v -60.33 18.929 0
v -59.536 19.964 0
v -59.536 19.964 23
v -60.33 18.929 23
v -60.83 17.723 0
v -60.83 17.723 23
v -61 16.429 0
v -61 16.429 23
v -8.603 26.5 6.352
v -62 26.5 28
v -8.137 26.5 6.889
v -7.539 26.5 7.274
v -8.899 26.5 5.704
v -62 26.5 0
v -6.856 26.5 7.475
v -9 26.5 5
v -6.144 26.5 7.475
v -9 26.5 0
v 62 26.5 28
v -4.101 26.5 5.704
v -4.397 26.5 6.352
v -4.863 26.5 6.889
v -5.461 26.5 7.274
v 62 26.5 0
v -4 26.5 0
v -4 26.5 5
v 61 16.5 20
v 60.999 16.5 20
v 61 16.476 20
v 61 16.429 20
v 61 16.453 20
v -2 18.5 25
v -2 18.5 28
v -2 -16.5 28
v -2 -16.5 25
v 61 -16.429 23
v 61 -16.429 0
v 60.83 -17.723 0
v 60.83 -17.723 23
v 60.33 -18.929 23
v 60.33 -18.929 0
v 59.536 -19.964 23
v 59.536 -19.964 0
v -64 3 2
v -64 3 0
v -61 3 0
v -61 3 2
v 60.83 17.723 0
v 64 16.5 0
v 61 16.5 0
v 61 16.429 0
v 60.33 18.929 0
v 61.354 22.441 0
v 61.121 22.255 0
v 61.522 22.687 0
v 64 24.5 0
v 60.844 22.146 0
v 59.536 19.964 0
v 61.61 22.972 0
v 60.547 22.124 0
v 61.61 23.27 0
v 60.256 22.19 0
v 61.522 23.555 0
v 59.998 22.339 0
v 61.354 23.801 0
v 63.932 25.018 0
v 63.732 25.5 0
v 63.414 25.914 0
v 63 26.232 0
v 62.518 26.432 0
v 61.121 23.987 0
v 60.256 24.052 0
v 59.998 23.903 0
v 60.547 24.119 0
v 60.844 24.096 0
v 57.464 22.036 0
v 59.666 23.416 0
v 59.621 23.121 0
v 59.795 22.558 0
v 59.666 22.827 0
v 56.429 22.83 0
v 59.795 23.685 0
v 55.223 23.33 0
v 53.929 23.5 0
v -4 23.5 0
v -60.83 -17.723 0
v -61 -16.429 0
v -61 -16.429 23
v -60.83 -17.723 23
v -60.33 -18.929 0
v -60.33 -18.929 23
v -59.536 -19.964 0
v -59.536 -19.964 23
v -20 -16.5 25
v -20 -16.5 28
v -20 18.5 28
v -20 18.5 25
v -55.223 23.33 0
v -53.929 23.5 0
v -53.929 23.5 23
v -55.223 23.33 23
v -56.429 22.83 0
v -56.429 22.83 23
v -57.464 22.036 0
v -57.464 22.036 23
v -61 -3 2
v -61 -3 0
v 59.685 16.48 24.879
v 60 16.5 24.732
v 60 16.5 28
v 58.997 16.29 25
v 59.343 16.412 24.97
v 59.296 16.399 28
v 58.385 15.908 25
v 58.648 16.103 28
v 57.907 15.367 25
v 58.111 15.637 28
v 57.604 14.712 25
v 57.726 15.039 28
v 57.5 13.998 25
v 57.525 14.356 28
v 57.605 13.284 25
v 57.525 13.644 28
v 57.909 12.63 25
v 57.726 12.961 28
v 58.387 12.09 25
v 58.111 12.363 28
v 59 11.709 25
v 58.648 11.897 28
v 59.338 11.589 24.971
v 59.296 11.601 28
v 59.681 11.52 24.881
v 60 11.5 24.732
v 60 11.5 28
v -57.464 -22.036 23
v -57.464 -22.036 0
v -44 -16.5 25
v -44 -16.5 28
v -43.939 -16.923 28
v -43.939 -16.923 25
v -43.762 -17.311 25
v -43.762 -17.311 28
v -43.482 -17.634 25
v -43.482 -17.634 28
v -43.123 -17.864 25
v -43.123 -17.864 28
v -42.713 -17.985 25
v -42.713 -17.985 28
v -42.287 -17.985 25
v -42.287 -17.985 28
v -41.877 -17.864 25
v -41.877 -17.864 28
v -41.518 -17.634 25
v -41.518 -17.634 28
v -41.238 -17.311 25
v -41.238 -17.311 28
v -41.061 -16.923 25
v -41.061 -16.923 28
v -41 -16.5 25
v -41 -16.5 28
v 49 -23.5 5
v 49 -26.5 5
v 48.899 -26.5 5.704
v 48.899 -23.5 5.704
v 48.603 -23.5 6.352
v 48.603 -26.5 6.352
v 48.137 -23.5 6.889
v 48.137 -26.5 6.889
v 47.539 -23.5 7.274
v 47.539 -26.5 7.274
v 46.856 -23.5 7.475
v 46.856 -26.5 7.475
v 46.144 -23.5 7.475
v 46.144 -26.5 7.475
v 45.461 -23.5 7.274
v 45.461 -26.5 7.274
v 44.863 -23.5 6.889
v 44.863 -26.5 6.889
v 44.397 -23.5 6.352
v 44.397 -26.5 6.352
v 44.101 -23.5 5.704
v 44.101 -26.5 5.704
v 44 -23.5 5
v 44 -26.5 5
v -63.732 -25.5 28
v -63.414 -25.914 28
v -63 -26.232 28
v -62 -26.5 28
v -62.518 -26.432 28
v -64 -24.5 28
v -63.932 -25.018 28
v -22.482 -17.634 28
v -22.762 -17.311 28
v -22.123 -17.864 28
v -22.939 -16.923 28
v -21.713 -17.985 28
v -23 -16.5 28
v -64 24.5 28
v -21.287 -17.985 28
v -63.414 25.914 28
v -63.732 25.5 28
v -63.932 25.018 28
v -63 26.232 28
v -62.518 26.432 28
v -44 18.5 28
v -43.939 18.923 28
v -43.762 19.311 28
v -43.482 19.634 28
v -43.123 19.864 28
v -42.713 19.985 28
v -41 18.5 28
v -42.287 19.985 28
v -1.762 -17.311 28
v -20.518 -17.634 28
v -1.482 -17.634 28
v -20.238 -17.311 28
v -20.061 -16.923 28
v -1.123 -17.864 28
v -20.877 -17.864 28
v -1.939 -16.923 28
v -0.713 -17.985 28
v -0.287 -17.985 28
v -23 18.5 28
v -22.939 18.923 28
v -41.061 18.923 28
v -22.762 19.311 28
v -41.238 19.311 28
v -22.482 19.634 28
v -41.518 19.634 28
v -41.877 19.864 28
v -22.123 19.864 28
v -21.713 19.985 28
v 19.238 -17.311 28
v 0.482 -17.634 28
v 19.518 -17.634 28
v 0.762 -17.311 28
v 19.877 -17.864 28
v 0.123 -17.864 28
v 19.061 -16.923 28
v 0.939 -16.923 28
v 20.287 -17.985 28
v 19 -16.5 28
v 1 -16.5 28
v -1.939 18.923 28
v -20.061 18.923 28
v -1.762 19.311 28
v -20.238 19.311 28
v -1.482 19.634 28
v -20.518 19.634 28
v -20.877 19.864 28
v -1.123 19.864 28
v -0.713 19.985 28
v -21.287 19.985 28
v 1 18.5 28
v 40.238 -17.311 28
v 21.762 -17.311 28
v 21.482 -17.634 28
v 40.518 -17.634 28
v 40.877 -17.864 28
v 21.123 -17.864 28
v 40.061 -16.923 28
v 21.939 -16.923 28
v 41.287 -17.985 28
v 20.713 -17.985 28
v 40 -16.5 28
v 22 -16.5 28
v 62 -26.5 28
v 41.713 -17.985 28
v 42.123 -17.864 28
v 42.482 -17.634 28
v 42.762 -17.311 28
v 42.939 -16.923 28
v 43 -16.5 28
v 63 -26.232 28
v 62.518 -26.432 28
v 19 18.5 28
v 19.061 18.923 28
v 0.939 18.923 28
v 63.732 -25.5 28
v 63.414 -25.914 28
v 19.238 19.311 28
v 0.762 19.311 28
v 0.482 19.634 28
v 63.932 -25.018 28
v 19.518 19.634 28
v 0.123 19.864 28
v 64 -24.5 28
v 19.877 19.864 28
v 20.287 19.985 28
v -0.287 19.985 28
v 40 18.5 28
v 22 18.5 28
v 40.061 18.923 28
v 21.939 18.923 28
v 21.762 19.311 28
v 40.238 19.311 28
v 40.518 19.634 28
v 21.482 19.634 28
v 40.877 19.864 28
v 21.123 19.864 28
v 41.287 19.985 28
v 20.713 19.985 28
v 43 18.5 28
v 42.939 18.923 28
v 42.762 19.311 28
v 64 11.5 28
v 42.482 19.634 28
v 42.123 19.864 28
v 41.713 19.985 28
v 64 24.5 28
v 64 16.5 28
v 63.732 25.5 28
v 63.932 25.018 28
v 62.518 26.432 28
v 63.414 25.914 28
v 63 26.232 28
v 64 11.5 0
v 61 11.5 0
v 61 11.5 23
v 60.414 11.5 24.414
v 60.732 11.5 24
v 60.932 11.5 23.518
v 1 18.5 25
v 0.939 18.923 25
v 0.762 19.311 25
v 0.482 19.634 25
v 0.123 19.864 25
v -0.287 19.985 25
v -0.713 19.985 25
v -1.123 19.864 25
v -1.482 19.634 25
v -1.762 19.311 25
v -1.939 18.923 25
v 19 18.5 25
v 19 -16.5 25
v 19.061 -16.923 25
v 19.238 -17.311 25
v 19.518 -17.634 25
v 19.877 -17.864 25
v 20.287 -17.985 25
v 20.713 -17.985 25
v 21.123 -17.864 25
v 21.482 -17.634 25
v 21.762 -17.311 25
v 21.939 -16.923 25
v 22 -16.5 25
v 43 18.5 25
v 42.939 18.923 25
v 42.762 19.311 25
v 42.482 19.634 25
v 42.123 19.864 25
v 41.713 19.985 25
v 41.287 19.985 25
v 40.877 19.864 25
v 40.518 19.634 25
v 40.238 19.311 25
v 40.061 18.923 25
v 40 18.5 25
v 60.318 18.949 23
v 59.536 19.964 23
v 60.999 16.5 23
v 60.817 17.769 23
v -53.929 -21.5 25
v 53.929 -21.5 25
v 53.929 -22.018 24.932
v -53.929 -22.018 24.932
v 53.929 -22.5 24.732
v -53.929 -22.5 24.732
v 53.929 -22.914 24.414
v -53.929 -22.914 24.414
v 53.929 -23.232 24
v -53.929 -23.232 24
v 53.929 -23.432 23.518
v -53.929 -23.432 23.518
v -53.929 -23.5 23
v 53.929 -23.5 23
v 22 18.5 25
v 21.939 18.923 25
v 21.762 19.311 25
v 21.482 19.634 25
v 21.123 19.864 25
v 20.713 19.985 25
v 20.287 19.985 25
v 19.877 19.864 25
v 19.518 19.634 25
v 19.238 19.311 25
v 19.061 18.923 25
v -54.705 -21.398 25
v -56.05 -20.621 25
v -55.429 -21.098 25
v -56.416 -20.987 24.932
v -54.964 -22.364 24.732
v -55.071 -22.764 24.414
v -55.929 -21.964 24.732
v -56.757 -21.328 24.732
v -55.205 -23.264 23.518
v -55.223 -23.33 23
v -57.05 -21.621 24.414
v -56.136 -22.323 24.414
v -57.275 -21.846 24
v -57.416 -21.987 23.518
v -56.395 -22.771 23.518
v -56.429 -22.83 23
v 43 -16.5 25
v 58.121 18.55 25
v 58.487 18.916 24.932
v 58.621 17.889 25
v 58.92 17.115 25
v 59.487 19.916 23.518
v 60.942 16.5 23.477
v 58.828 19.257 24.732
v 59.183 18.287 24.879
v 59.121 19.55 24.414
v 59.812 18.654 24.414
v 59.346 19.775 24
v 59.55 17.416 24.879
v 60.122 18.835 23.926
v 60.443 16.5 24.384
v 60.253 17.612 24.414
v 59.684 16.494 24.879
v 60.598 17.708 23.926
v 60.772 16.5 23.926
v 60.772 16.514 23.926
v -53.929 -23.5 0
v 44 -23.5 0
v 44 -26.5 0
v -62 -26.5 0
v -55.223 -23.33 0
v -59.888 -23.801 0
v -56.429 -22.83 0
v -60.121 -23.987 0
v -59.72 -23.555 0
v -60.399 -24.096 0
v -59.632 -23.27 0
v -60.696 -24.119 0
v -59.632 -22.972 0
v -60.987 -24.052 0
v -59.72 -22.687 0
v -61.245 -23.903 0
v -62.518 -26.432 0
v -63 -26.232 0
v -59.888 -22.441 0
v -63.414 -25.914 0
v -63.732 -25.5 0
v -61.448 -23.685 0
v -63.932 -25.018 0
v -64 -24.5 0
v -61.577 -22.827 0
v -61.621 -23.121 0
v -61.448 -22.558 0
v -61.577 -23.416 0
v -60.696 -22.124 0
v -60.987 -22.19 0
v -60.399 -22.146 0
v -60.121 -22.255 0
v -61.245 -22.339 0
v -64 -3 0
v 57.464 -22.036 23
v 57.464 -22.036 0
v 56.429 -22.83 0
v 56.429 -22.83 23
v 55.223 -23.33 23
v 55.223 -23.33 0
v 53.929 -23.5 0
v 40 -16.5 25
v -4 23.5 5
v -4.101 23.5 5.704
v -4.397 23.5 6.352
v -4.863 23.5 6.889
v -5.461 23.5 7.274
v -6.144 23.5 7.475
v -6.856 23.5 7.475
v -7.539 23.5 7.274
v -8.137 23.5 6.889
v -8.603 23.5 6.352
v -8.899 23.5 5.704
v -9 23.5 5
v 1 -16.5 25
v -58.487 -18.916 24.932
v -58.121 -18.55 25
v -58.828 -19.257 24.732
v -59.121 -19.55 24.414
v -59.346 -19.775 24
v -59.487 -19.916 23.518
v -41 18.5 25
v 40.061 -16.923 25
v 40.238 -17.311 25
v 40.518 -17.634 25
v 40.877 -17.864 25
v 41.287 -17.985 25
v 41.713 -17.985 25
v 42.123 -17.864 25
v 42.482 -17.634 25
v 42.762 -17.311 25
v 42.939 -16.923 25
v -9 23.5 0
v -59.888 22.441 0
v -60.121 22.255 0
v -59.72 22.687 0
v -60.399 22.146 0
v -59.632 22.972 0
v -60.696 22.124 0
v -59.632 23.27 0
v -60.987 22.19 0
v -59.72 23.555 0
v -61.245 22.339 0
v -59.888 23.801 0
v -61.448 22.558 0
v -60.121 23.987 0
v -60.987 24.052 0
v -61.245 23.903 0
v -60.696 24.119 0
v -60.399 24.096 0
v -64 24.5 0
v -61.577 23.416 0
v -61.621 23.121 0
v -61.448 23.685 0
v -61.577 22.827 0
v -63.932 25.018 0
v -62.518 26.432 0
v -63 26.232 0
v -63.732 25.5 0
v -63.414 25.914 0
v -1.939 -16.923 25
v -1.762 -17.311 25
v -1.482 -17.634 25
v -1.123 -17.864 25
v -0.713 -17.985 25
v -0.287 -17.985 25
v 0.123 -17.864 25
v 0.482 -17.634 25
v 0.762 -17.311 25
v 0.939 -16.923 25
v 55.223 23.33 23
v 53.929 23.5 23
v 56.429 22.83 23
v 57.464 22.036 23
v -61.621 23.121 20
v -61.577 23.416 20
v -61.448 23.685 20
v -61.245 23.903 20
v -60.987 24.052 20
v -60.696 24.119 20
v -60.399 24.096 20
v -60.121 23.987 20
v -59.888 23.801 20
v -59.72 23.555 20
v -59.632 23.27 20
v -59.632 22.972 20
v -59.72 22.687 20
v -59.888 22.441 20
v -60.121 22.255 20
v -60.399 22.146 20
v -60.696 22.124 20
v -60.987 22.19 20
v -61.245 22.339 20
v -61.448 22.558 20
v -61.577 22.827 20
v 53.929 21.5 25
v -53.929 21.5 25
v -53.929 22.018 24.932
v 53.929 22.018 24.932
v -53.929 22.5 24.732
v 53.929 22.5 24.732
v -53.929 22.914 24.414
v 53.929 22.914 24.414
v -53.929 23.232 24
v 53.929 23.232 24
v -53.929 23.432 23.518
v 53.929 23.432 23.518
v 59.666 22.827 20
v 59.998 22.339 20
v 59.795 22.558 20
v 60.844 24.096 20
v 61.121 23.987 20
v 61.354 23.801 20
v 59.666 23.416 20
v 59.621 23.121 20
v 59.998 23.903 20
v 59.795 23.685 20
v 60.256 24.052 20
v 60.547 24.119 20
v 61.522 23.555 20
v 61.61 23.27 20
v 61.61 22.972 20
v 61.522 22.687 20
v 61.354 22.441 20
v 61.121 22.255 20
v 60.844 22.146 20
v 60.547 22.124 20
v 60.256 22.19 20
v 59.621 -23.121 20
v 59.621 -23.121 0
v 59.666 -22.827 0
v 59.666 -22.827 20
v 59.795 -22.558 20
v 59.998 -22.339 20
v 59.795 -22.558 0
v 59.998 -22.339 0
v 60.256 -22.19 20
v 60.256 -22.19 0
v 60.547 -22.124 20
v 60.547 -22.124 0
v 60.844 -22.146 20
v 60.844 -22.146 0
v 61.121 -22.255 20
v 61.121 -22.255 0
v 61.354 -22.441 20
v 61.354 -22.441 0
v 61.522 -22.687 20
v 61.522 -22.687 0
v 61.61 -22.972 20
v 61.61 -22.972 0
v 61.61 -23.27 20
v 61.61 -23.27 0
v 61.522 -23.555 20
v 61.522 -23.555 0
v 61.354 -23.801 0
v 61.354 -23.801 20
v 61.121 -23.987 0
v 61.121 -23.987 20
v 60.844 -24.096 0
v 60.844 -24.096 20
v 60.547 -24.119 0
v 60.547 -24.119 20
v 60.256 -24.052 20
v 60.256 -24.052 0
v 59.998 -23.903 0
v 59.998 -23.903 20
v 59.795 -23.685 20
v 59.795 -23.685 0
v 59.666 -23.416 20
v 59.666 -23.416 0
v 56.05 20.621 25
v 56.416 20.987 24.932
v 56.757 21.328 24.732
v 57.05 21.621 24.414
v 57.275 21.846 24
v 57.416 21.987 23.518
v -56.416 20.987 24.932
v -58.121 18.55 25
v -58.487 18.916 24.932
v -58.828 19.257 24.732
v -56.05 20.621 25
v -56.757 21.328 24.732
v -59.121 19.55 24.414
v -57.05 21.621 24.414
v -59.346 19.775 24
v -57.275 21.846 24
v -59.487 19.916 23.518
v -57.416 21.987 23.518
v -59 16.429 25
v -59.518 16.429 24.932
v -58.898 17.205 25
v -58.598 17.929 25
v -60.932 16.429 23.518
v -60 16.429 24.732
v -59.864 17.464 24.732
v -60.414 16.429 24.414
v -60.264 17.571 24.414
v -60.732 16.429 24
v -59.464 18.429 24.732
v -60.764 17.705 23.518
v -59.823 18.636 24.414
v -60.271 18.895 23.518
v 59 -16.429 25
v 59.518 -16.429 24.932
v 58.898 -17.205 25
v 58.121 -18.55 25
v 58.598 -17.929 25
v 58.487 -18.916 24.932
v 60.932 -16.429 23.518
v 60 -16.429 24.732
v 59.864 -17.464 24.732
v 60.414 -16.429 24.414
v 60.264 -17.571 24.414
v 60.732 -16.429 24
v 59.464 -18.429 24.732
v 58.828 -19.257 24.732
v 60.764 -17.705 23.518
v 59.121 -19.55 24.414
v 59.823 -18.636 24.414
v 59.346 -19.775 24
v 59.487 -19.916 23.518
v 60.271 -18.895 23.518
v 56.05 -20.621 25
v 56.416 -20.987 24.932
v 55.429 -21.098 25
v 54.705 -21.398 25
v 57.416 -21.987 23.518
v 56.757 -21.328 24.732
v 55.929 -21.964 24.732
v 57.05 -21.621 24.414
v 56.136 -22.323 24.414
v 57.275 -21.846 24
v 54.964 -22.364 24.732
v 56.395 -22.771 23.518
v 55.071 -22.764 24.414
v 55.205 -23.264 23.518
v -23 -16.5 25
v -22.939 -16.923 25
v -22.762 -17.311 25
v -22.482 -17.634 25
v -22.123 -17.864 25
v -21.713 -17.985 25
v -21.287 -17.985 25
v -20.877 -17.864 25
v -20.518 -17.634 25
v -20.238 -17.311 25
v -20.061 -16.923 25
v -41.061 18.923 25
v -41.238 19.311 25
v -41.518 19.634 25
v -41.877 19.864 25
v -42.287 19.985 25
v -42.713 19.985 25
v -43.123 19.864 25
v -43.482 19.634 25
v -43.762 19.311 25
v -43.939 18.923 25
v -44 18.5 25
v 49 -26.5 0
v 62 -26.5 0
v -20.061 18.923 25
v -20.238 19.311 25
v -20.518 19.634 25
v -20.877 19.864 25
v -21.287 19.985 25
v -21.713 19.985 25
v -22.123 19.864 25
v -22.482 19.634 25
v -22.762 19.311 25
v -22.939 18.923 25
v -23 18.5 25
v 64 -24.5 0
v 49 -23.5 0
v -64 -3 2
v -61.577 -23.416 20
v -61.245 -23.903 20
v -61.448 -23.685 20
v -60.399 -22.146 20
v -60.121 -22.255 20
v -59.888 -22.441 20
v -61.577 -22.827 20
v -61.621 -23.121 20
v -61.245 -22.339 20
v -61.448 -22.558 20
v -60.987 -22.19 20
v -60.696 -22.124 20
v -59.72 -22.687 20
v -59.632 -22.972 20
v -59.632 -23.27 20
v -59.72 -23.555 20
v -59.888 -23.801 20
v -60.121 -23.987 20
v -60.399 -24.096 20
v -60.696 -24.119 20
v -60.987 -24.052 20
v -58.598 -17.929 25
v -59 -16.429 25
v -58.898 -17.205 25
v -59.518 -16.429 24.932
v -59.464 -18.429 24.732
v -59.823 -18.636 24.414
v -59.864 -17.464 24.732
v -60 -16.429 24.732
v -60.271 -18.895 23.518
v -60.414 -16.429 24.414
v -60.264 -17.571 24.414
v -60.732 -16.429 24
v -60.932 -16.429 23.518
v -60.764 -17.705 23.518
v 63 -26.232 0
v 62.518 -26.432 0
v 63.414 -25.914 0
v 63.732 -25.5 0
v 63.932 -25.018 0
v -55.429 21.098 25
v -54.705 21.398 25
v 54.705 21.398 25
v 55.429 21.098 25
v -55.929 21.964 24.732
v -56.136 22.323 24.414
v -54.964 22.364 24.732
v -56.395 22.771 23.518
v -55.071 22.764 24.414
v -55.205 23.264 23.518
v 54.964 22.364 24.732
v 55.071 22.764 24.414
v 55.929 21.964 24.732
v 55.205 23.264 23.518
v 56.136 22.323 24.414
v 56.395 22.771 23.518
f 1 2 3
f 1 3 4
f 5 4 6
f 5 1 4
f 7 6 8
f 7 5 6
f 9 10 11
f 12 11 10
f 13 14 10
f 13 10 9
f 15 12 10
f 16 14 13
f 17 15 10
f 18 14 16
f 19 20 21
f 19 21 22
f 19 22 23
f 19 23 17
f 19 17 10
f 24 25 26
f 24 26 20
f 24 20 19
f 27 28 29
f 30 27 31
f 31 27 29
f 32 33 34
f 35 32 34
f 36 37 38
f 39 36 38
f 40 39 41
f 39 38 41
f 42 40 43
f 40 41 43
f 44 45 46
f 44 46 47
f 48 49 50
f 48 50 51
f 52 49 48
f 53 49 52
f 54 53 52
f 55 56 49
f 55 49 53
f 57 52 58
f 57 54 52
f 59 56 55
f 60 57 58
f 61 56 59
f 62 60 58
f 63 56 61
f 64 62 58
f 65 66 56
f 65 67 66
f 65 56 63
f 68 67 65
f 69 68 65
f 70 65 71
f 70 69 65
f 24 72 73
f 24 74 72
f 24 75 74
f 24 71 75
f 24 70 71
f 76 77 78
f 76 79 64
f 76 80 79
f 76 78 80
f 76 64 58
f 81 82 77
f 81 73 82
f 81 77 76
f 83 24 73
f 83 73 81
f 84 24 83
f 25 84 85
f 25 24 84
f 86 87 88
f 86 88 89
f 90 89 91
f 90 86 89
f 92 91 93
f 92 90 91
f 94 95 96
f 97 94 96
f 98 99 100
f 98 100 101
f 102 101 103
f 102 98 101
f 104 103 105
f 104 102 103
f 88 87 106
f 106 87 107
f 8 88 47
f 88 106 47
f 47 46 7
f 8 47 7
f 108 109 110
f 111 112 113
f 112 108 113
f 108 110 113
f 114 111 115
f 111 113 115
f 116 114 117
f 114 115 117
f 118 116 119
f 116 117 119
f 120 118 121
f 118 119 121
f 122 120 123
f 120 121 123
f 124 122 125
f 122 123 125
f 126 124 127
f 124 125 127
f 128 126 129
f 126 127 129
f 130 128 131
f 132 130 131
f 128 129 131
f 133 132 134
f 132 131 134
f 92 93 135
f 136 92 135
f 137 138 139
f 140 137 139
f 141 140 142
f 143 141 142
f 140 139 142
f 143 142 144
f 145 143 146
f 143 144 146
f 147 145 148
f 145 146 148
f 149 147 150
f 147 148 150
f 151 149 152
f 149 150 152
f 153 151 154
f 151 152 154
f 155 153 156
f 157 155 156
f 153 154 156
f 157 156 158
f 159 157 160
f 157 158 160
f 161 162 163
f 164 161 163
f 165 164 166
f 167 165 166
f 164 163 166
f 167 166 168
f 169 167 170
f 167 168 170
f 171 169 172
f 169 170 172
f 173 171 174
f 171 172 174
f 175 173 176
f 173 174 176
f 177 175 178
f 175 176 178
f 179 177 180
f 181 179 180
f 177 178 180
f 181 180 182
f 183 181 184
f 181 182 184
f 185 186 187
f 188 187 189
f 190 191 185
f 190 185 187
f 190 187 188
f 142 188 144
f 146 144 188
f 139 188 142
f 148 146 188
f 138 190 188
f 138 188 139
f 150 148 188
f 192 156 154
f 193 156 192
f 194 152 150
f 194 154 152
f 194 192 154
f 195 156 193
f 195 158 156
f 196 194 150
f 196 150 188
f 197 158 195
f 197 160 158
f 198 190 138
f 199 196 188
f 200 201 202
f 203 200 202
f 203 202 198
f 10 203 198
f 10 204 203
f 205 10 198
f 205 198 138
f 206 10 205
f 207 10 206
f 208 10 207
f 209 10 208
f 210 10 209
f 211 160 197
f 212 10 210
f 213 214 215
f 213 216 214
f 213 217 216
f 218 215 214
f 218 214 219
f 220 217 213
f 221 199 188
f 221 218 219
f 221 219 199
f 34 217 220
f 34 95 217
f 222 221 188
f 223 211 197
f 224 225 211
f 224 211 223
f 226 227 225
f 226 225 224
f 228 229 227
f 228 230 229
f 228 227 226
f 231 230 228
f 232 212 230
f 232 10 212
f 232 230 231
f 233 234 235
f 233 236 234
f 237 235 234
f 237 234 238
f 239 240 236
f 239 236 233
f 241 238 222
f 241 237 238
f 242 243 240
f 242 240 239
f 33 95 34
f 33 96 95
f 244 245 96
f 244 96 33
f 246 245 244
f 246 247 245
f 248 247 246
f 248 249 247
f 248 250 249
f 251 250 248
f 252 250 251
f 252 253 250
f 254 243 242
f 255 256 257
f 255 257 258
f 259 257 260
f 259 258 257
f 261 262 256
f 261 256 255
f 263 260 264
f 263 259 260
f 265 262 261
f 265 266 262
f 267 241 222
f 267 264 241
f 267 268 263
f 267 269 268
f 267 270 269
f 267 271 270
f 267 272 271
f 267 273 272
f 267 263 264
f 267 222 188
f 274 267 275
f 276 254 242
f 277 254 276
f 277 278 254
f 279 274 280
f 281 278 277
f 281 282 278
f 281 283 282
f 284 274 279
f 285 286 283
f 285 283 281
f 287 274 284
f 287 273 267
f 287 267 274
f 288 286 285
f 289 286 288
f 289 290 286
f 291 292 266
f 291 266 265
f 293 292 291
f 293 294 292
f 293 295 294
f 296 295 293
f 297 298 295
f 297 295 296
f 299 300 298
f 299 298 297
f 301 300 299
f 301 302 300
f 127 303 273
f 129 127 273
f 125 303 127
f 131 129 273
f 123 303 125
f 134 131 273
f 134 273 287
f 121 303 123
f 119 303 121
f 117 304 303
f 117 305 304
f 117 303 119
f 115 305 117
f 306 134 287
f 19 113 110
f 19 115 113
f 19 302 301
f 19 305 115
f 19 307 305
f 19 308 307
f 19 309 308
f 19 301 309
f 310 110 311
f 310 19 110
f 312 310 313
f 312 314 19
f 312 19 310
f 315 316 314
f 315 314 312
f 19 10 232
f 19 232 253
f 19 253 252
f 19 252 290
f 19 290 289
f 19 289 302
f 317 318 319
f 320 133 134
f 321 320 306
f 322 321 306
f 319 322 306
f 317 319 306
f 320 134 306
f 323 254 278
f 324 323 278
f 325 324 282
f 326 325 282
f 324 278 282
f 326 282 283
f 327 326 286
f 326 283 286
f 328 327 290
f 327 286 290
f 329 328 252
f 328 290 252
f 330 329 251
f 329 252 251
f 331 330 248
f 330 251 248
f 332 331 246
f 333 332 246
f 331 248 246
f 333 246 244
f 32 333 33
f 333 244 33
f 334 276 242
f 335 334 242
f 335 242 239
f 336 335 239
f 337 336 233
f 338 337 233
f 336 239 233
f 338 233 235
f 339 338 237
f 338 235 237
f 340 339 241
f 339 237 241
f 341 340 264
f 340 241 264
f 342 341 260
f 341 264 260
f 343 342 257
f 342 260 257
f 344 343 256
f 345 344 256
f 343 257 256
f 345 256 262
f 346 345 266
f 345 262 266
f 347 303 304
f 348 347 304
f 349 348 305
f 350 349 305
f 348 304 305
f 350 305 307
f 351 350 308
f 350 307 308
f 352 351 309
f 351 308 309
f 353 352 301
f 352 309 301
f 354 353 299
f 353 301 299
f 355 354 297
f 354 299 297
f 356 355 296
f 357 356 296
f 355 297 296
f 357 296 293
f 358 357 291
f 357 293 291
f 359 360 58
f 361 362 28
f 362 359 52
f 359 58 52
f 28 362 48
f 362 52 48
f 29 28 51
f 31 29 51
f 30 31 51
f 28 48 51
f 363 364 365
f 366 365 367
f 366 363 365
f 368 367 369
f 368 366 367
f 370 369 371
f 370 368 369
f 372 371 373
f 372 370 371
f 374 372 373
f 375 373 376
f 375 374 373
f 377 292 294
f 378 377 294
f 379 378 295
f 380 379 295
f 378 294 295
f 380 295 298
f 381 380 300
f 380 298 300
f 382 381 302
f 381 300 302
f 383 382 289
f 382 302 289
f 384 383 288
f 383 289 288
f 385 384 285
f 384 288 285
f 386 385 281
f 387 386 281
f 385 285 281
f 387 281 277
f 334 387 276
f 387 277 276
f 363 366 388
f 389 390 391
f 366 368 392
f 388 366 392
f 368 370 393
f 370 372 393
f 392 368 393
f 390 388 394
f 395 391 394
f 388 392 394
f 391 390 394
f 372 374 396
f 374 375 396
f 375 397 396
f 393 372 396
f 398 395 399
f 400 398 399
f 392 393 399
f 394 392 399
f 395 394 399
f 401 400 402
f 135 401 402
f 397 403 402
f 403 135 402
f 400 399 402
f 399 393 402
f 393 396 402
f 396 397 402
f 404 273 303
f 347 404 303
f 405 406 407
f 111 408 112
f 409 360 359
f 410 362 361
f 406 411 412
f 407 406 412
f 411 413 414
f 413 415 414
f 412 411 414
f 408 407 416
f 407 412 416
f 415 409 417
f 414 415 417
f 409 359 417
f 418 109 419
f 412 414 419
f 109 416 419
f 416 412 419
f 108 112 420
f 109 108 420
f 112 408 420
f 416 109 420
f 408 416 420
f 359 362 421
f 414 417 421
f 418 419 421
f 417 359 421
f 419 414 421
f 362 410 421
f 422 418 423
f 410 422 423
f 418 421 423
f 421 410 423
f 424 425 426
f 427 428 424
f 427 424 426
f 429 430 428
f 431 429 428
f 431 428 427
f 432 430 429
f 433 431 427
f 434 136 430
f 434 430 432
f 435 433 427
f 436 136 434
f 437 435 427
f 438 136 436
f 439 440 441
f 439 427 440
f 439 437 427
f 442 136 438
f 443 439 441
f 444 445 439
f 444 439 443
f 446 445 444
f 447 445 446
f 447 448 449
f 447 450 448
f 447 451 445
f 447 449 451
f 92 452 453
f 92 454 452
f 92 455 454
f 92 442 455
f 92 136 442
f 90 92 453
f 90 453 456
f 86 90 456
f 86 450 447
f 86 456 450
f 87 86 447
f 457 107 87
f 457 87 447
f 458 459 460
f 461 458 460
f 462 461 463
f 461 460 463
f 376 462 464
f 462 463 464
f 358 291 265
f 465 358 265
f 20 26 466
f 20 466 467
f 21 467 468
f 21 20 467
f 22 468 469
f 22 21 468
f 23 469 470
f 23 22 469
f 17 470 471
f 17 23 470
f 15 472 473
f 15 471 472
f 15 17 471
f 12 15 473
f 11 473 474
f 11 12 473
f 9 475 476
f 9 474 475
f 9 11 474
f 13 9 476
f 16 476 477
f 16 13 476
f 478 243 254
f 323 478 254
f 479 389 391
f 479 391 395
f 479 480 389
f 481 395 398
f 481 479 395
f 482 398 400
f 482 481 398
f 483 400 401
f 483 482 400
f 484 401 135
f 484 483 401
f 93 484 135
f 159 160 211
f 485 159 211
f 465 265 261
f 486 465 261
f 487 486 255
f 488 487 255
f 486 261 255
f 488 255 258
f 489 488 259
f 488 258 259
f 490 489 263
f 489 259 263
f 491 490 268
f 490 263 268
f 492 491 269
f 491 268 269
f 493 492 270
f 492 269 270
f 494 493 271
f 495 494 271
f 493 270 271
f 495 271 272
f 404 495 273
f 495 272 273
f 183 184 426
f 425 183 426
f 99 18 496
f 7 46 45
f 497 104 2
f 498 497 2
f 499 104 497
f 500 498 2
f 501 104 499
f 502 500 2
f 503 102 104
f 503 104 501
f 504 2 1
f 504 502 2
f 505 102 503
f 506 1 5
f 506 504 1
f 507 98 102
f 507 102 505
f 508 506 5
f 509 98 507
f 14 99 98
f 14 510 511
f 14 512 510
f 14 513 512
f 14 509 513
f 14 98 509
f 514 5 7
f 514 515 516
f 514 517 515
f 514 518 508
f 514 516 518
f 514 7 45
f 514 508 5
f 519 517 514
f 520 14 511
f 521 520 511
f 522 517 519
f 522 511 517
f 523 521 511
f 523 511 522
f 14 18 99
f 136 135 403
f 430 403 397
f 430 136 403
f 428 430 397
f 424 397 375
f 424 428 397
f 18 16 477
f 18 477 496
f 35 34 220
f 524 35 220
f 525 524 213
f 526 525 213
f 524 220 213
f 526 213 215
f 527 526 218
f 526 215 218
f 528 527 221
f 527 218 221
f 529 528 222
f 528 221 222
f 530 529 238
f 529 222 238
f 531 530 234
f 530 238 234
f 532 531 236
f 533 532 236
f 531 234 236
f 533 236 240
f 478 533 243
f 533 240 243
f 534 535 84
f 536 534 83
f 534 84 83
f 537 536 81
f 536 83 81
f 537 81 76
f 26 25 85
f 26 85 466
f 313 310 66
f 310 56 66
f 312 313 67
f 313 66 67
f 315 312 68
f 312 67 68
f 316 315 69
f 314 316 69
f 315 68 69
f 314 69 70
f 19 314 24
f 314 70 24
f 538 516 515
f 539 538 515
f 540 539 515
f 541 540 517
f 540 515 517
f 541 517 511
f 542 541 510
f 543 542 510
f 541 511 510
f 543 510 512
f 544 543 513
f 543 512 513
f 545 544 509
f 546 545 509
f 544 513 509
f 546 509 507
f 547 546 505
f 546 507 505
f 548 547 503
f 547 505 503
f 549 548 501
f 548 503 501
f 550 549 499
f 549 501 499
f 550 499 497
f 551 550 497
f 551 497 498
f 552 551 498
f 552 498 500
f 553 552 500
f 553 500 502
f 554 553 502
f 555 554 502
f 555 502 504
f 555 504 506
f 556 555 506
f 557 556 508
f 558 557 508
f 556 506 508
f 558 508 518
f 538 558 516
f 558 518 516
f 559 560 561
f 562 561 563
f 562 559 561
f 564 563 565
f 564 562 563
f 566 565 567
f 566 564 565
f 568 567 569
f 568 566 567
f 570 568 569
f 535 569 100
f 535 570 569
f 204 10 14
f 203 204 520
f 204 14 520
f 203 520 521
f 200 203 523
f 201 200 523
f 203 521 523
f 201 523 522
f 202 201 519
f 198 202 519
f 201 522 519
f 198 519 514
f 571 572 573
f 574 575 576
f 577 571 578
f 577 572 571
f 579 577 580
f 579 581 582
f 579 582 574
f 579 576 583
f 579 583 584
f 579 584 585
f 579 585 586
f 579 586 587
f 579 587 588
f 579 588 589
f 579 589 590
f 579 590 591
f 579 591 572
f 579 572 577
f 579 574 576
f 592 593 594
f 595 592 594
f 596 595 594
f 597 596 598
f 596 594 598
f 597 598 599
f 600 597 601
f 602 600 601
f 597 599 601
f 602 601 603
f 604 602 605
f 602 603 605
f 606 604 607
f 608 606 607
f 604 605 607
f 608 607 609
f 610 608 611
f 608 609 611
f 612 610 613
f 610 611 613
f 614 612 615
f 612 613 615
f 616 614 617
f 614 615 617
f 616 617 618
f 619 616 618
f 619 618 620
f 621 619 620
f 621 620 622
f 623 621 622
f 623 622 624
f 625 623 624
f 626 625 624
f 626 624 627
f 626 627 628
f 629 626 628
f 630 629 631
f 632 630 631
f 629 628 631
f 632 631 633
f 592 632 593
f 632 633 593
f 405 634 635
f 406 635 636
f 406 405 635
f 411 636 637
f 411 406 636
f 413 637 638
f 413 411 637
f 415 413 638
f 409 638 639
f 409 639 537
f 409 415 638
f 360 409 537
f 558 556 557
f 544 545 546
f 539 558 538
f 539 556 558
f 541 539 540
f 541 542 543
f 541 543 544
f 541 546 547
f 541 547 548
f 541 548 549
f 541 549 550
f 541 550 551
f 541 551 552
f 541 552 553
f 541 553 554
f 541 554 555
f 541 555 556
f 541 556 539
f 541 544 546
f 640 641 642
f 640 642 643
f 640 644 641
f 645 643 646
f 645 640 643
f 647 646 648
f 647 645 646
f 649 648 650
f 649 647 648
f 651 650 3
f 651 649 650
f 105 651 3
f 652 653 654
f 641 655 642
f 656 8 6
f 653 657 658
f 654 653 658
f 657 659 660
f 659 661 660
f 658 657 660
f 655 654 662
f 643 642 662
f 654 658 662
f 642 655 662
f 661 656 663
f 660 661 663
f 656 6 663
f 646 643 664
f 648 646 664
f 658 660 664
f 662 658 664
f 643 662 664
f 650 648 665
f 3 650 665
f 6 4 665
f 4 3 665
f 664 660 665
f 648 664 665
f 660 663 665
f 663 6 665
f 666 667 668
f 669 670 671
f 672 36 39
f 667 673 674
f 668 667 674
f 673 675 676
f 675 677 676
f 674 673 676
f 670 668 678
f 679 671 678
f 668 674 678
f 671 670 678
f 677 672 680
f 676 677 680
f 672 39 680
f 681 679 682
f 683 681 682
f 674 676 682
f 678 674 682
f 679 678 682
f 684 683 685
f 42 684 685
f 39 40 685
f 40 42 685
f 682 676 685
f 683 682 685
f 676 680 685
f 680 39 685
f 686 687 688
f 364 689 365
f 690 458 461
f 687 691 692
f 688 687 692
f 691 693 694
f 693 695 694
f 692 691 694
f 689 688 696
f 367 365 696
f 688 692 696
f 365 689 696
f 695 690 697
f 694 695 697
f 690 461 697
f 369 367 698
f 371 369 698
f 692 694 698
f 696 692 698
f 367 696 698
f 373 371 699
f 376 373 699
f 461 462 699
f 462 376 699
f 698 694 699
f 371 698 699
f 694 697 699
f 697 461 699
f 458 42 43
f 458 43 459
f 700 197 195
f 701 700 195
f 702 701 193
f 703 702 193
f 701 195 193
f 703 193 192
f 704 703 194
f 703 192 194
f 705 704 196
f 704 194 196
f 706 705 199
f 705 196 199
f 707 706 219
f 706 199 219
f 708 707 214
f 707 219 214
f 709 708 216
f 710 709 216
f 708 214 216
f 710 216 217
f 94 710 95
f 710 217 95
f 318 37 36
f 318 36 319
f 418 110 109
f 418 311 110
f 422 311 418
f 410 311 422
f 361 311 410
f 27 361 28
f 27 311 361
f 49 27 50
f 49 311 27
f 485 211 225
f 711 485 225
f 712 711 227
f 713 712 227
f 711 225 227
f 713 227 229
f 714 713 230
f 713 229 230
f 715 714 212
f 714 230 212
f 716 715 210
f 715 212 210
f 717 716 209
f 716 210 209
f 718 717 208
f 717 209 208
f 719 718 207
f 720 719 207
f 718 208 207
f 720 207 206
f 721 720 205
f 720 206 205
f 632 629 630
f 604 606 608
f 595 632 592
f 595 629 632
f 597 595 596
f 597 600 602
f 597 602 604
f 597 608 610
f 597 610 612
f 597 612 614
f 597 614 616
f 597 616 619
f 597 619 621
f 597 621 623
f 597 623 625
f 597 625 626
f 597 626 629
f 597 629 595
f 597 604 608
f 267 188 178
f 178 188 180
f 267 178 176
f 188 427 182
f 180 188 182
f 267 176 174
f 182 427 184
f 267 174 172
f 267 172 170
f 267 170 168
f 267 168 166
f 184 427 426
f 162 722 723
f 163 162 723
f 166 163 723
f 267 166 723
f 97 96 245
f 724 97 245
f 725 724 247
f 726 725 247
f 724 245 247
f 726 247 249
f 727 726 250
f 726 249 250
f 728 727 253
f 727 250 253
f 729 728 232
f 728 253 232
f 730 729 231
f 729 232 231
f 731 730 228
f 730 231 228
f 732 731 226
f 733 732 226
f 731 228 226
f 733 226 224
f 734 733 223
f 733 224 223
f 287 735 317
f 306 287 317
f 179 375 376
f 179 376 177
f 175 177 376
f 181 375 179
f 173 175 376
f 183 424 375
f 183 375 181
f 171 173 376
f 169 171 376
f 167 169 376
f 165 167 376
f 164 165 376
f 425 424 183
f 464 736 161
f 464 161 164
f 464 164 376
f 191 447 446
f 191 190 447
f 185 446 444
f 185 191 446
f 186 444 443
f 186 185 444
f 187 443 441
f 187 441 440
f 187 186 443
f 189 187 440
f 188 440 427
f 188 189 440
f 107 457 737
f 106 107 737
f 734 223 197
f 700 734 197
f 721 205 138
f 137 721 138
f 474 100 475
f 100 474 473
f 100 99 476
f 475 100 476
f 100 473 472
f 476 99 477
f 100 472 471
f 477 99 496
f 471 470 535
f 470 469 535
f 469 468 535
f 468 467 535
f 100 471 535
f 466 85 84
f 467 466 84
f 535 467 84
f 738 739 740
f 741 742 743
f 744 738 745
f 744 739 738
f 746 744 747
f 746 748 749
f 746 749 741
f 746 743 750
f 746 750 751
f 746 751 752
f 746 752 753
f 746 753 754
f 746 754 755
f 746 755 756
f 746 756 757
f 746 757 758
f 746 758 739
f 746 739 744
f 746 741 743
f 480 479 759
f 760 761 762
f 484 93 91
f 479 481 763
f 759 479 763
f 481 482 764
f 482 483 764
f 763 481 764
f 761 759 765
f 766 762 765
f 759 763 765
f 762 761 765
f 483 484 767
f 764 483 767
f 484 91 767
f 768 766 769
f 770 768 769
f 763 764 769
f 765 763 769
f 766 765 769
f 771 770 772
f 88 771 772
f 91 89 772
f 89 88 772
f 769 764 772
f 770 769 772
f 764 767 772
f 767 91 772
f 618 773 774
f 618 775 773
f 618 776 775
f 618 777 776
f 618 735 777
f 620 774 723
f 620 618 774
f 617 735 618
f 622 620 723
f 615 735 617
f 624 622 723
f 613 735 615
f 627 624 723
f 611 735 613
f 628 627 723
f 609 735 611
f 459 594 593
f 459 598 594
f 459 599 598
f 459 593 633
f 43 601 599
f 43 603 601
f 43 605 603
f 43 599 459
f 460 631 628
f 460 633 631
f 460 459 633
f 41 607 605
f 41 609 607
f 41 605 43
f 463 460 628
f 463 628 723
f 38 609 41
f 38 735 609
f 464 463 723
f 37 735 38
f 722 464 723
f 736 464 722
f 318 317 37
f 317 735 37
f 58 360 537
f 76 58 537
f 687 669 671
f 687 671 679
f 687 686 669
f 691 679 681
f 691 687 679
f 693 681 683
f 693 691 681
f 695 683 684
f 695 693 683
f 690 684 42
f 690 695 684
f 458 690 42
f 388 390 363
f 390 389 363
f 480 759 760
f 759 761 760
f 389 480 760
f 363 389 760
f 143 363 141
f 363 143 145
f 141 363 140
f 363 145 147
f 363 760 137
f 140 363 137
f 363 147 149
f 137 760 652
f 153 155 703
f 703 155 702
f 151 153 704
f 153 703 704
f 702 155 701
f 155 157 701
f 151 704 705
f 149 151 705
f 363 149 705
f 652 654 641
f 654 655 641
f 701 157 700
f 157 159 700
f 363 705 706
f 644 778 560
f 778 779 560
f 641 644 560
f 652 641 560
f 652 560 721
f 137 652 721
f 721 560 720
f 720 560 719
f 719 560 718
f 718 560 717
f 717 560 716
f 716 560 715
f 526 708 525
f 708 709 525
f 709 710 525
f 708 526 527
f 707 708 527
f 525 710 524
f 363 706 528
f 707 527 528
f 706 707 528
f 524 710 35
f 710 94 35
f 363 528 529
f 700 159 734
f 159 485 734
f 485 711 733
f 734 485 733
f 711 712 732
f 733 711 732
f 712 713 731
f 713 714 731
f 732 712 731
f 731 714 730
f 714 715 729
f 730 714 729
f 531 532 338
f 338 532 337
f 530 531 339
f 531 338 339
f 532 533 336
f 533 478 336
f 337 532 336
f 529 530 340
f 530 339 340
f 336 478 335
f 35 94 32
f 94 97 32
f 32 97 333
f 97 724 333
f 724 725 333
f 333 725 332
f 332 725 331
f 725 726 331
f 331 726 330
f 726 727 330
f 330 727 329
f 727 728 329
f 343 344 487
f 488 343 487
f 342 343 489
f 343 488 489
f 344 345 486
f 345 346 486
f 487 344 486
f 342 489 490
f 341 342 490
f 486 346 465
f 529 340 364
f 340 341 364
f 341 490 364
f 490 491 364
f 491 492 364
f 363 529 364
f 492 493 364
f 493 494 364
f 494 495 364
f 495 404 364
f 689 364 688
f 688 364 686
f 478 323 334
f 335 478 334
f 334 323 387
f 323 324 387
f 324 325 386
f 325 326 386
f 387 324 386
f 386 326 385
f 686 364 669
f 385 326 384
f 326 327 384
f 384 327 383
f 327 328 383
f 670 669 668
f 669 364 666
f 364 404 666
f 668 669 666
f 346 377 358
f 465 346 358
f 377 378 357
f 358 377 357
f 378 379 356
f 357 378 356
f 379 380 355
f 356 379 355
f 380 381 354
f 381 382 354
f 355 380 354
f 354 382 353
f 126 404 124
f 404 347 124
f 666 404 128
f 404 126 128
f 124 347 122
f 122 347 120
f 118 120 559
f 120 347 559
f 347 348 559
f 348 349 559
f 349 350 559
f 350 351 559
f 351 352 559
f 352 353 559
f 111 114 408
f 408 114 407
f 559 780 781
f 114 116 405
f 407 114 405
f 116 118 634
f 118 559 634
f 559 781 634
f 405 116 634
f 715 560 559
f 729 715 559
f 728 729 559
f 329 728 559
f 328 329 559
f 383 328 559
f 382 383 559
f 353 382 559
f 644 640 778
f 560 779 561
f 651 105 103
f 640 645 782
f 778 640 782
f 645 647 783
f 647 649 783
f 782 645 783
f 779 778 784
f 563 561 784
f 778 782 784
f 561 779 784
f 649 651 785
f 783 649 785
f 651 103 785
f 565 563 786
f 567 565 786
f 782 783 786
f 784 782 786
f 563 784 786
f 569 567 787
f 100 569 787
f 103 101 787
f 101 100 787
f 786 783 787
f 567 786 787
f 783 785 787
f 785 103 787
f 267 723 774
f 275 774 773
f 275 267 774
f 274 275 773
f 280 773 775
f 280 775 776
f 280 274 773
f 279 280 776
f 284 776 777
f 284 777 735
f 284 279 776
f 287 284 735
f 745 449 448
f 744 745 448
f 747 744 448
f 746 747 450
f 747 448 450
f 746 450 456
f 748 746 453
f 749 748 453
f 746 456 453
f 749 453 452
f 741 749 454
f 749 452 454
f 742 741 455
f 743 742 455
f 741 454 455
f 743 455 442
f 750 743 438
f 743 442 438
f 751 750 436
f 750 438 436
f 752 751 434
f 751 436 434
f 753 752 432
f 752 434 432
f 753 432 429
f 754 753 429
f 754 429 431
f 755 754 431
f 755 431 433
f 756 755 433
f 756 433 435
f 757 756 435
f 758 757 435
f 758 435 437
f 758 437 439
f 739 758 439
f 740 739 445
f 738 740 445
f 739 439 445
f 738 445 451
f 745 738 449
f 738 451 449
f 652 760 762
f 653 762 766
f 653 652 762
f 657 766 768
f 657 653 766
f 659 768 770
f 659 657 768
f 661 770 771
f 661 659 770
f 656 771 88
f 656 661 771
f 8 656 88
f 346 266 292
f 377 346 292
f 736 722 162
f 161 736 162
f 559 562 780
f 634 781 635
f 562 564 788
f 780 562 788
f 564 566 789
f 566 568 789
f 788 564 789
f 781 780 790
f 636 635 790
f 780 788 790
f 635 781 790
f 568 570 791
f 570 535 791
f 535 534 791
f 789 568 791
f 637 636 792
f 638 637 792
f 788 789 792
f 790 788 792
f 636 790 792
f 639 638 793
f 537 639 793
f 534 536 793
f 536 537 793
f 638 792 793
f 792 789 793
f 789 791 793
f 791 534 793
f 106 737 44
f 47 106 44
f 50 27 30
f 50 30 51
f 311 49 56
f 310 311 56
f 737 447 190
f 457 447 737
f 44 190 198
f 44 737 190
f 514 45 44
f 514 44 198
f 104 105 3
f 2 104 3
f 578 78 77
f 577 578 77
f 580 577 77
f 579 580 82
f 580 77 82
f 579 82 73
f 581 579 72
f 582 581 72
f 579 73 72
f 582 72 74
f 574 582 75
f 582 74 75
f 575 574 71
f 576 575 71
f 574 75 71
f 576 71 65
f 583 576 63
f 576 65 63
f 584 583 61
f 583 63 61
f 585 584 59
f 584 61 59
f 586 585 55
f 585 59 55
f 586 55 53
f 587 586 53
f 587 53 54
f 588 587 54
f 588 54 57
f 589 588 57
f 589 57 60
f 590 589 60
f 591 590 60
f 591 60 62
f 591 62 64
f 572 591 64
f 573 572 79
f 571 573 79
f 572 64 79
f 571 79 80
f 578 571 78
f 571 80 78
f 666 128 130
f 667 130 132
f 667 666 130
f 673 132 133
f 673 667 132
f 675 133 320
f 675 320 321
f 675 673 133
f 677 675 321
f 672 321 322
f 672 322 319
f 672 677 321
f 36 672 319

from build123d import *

# Parameters (mm, degrees)
ESQUISSE1_W             = 128
ESQUISSE1_H             = 53
ESQUISSE1_W_2           = 122
ESQUISSE1_H_2           = 47
BOSS_EXTRU_1_DEPTH      = 25
ESQUISSE2_W             = 128
ESQUISSE2_H             = 53
BOSS_EXTRU_2_DEPTH      = 3
BOSS_EXTRU_3_DEPTH      = 25
ENL_V_MAT_EXTRU_1_DEPTH = 3
ESQUISSE5_R             = 1
ENL_V_MAT_EXTRU_2_DEPTH = 20
CONG_1_R                = 5
CONG_2_R                = 5
ESQUISSE6_W             = 28
ESQUISSE6_H             = 5
ENL_V_MAT_EXTRU_3_DEPTH = 3
ENL_V_MAT_EXTRU_4_DEPTH = 8
ENL_V_MAT_EXTRU_6_DEPTH = 8
ENL_V_MAT_EXTRU_7_DEPTH = 8
ESQUISSE13_W            = 2
ESQUISSE13_H            = 6
ENL_V_MAT_EXTRU_8_DEPTH = 3
CONG_4_R                = 2
CONG_5_R                = 2


with BuildPart() as part:
    # Esquisse1 → Boss.-Extru.1 (new body)
    with BuildSketch(Plane.XY):
        Rectangle(ESQUISSE1_W, ESQUISSE1_H)
        Rectangle(ESQUISSE1_W_2, ESQUISSE1_H_2, mode=Mode.SUBTRACT)
    extrude(amount=BOSS_EXTRU_1_DEPTH)

    # Esquisse2 → Boss.-Extru.2 (add)
    with BuildSketch(Plane.XY.offset(25)):
        Rectangle(ESQUISSE2_W, ESQUISSE2_H)
    extrude(amount=BOSS_EXTRU_2_DEPTH)

    # Esquisse3 → Boss.-Extru.3 (add)
    with BuildSketch(Plane(origin=(0, 0, 25), x_dir=(-1, 0, 0), z_dir=(0, 0, -1))):
        Polygon((61, 23.5), (56, 23.5), (61, 18.5), align=None)
        Polygon((61, -23.5), (61, -18.5), (56, -23.5), align=None)
        Polygon((-61, -23.5), (-61, -18.5), (-56, -23.5), align=None)
        Polygon((-61, 18.5), (-56, 23.5), (-61, 23.5), align=None)
    extrude(amount=BOSS_EXTRU_3_DEPTH)

    # Esquisse4 → Enlèv. mat.-Extru.1 (cut)
    with BuildSketch(Plane.XY.offset(28)):
        with BuildLine():
            Line((-44, 18.5), (-44, -16.5))
            ThreePointArc((-44, -16.5), (-42.5, -18), (-41, -16.5))
            Line((-41, -16.5), (-41, 18.5))
            ThreePointArc((-41, 18.5), (-42.5, 20), (-44, 18.5))
        make_face()
        with BuildLine():
            Line((-23, 18.5), (-23, -16.5))
            ThreePointArc((-23, -16.5), (-21.5, -18), (-20, -16.5))
            Line((-20, -16.5), (-20, 18.5))
            ThreePointArc((-20, 18.5), (-21.5, 20), (-23, 18.5))
        make_face()
        with BuildLine():
            Line((-2, 18.5), (-2, -16.5))
            ThreePointArc((-2, -16.5), (-0.5, -18), (1, -16.5))
            Line((1, -16.5), (1, 18.5))
            ThreePointArc((1, 18.5), (-0.5, 20), (-2, 18.5))
        make_face()
        with BuildLine():
            Line((19, 18.5), (19, -16.5))
            ThreePointArc((19, -16.5), (20.5, -18), (22, -16.5))
            Line((22, -16.5), (22, 18.5))
            ThreePointArc((22, 18.5), (20.5, 20), (19, 18.5))
        make_face()
        with BuildLine():
            Line((40, 18.5), (40, -16.5))
            ThreePointArc((40, -16.5), (41.5, -18), (43, -16.5))
            Line((43, -16.5), (43, 18.5))
            ThreePointArc((43, 18.5), (41.5, 20), (40, 18.5))
        make_face()
    extrude(amount=-ENL_V_MAT_EXTRU_1_DEPTH, mode=Mode.SUBTRACT)

    # Esquisse5 → Enlèv. mat.-Extru.2 (cut)
    with BuildSketch(Plane(origin=(0, 0, 0), x_dir=(-1, 0, 0), z_dir=(0, 0, -1))):
        with Locations((-60.621320344, 23.121320344)):
            Circle(ESQUISSE5_R)
        with Locations((60.621320344, 23.121320344)):
            Circle(ESQUISSE5_R)
        with Locations((-60.621320344, -23.121320344)):
            Circle(ESQUISSE5_R)
        with Locations((60.621320344, -23.121320344)):
            Circle(ESQUISSE5_R)
    extrude(amount=-ENL_V_MAT_EXTRU_2_DEPTH, mode=Mode.SUBTRACT)

    # Congé1
    cong_1_edges = [part.edges().sort_by_distance(p)[0] for p in [
        (56, 23.5, 12.5),
    ]]
    fillet(cong_1_edges, radius=CONG_1_R)

    # Congé2
    cong_2_edges = [part.edges().sort_by_distance(p)[0] for p in [
        (-56, 23.5, 12.5),
        (-61, 18.5, 12.5),
        (-56, -23.5, 12.5),
        (-61, -18.5, 12.5),
        (56, -23.5, 12.5),
        (61, -18.5, 12.5),
        (61, 18.5, 12.5),
    ]]
    fillet(cong_2_edges, radius=CONG_2_R)

    # Esquisse6 → Enlèv. mat.-Extru.3 (cut)
    with BuildSketch(Plane(origin=(64, 0, 0), x_dir=(0, 0, -1), z_dir=(1, 0, 0))):
        with Locations((-14, 14)):
            Rectangle(ESQUISSE6_W, ESQUISSE6_H)
    extrude(amount=-ENL_V_MAT_EXTRU_3_DEPTH, mode=Mode.SUBTRACT)

    # Esquisse7 → Enlèv. mat.-Extru.4 (cut)
    with BuildSketch(Plane(origin=(0, 26.5, 0), x_dir=(1, 0, 0), z_dir=(0, 1, 0))):
        with BuildLine():
            Line((-9, 0), (-4, 0))
            Line((-4, 0), (-4, -5))
            ThreePointArc((-4, -5), (-6.5, -7.5), (-9, -5))
            Line((-9, -5), (-9, 0))
        make_face()
    extrude(amount=-ENL_V_MAT_EXTRU_4_DEPTH, mode=Mode.SUBTRACT)

    # Esquisse9 → Enlèv. mat.-Extru.6 (cut)
    with BuildSketch(Plane.XZ.offset(26.5)):
        with BuildLine():
            Line((44, 0), (49, 0))
            Line((49, 0), (49, 5))
            ThreePointArc((49, 5), (46.5, 7.5), (44, 5))
            Line((44, 5), (44, 0))
        make_face()
    extrude(amount=-ENL_V_MAT_EXTRU_6_DEPTH, mode=Mode.SUBTRACT)

    # Esquisse10 → Enlèv. mat.-Extru.7 (cut)
    with BuildSketch(Plane.XY.offset(28)):
        with BuildLine():
            Line((61, 16.5), (60, 16.5))
            ThreePointArc((60, 16.5), (57.5, 14), (60, 11.5))
            Line((60, 11.5), (61, 11.5))
            Line((61, 11.5), (61, 16.5))
        make_face()
    extrude(amount=-ENL_V_MAT_EXTRU_7_DEPTH, mode=Mode.SUBTRACT)

    # Esquisse13 → Enlèv. mat.-Extru.8 (cut)
    with BuildSketch(Plane.ZY.offset(64)):
        with Locations((1, 0)):
            Rectangle(ESQUISSE13_W, ESQUISSE13_H)
    extrude(amount=-ENL_V_MAT_EXTRU_8_DEPTH, mode=Mode.SUBTRACT)

    # Congé4
    cong_4_edges = [part.edges().sort_by_distance(p)[0] for p in [
        (60.60568242, 18.375130905, 25),
        (58.5, 21, 25),
        (55.84234935, 23.119397663, 25),
        (61, -2.464466094, 25),
        (60.619397663, -18.34234935, 25),
        (58.5, -21, 25),
        (55.84234935, -23.119397663, 25),
        (0, -23.5, 25),
        (-55.84234935, -23.119397663, 25),
        (-58.5, -21, 25),
        (-60.619397663, -18.34234935, 25),
        (-61, 0, 25),
        (-60.619397663, 18.34234935, 25),
        (-58.5, 21, 25),
        (-55.84234935, 23.119397663, 25),
        (0, 23.5, 25),
    ]]
    fillet(cong_4_edges, radius=CONG_4_R)

    # Congé5
    cong_5_edges = [part.edges().sort_by_distance(p)[0] for p in [
        (-64, 26.5, 14),
        (64, 26.5, 14),
        (64, -26.5, 14),
        (-64, -26.5, 14),
    ]]
    fillet(cong_5_edges, radius=CONG_5_R)


solid = part.part
